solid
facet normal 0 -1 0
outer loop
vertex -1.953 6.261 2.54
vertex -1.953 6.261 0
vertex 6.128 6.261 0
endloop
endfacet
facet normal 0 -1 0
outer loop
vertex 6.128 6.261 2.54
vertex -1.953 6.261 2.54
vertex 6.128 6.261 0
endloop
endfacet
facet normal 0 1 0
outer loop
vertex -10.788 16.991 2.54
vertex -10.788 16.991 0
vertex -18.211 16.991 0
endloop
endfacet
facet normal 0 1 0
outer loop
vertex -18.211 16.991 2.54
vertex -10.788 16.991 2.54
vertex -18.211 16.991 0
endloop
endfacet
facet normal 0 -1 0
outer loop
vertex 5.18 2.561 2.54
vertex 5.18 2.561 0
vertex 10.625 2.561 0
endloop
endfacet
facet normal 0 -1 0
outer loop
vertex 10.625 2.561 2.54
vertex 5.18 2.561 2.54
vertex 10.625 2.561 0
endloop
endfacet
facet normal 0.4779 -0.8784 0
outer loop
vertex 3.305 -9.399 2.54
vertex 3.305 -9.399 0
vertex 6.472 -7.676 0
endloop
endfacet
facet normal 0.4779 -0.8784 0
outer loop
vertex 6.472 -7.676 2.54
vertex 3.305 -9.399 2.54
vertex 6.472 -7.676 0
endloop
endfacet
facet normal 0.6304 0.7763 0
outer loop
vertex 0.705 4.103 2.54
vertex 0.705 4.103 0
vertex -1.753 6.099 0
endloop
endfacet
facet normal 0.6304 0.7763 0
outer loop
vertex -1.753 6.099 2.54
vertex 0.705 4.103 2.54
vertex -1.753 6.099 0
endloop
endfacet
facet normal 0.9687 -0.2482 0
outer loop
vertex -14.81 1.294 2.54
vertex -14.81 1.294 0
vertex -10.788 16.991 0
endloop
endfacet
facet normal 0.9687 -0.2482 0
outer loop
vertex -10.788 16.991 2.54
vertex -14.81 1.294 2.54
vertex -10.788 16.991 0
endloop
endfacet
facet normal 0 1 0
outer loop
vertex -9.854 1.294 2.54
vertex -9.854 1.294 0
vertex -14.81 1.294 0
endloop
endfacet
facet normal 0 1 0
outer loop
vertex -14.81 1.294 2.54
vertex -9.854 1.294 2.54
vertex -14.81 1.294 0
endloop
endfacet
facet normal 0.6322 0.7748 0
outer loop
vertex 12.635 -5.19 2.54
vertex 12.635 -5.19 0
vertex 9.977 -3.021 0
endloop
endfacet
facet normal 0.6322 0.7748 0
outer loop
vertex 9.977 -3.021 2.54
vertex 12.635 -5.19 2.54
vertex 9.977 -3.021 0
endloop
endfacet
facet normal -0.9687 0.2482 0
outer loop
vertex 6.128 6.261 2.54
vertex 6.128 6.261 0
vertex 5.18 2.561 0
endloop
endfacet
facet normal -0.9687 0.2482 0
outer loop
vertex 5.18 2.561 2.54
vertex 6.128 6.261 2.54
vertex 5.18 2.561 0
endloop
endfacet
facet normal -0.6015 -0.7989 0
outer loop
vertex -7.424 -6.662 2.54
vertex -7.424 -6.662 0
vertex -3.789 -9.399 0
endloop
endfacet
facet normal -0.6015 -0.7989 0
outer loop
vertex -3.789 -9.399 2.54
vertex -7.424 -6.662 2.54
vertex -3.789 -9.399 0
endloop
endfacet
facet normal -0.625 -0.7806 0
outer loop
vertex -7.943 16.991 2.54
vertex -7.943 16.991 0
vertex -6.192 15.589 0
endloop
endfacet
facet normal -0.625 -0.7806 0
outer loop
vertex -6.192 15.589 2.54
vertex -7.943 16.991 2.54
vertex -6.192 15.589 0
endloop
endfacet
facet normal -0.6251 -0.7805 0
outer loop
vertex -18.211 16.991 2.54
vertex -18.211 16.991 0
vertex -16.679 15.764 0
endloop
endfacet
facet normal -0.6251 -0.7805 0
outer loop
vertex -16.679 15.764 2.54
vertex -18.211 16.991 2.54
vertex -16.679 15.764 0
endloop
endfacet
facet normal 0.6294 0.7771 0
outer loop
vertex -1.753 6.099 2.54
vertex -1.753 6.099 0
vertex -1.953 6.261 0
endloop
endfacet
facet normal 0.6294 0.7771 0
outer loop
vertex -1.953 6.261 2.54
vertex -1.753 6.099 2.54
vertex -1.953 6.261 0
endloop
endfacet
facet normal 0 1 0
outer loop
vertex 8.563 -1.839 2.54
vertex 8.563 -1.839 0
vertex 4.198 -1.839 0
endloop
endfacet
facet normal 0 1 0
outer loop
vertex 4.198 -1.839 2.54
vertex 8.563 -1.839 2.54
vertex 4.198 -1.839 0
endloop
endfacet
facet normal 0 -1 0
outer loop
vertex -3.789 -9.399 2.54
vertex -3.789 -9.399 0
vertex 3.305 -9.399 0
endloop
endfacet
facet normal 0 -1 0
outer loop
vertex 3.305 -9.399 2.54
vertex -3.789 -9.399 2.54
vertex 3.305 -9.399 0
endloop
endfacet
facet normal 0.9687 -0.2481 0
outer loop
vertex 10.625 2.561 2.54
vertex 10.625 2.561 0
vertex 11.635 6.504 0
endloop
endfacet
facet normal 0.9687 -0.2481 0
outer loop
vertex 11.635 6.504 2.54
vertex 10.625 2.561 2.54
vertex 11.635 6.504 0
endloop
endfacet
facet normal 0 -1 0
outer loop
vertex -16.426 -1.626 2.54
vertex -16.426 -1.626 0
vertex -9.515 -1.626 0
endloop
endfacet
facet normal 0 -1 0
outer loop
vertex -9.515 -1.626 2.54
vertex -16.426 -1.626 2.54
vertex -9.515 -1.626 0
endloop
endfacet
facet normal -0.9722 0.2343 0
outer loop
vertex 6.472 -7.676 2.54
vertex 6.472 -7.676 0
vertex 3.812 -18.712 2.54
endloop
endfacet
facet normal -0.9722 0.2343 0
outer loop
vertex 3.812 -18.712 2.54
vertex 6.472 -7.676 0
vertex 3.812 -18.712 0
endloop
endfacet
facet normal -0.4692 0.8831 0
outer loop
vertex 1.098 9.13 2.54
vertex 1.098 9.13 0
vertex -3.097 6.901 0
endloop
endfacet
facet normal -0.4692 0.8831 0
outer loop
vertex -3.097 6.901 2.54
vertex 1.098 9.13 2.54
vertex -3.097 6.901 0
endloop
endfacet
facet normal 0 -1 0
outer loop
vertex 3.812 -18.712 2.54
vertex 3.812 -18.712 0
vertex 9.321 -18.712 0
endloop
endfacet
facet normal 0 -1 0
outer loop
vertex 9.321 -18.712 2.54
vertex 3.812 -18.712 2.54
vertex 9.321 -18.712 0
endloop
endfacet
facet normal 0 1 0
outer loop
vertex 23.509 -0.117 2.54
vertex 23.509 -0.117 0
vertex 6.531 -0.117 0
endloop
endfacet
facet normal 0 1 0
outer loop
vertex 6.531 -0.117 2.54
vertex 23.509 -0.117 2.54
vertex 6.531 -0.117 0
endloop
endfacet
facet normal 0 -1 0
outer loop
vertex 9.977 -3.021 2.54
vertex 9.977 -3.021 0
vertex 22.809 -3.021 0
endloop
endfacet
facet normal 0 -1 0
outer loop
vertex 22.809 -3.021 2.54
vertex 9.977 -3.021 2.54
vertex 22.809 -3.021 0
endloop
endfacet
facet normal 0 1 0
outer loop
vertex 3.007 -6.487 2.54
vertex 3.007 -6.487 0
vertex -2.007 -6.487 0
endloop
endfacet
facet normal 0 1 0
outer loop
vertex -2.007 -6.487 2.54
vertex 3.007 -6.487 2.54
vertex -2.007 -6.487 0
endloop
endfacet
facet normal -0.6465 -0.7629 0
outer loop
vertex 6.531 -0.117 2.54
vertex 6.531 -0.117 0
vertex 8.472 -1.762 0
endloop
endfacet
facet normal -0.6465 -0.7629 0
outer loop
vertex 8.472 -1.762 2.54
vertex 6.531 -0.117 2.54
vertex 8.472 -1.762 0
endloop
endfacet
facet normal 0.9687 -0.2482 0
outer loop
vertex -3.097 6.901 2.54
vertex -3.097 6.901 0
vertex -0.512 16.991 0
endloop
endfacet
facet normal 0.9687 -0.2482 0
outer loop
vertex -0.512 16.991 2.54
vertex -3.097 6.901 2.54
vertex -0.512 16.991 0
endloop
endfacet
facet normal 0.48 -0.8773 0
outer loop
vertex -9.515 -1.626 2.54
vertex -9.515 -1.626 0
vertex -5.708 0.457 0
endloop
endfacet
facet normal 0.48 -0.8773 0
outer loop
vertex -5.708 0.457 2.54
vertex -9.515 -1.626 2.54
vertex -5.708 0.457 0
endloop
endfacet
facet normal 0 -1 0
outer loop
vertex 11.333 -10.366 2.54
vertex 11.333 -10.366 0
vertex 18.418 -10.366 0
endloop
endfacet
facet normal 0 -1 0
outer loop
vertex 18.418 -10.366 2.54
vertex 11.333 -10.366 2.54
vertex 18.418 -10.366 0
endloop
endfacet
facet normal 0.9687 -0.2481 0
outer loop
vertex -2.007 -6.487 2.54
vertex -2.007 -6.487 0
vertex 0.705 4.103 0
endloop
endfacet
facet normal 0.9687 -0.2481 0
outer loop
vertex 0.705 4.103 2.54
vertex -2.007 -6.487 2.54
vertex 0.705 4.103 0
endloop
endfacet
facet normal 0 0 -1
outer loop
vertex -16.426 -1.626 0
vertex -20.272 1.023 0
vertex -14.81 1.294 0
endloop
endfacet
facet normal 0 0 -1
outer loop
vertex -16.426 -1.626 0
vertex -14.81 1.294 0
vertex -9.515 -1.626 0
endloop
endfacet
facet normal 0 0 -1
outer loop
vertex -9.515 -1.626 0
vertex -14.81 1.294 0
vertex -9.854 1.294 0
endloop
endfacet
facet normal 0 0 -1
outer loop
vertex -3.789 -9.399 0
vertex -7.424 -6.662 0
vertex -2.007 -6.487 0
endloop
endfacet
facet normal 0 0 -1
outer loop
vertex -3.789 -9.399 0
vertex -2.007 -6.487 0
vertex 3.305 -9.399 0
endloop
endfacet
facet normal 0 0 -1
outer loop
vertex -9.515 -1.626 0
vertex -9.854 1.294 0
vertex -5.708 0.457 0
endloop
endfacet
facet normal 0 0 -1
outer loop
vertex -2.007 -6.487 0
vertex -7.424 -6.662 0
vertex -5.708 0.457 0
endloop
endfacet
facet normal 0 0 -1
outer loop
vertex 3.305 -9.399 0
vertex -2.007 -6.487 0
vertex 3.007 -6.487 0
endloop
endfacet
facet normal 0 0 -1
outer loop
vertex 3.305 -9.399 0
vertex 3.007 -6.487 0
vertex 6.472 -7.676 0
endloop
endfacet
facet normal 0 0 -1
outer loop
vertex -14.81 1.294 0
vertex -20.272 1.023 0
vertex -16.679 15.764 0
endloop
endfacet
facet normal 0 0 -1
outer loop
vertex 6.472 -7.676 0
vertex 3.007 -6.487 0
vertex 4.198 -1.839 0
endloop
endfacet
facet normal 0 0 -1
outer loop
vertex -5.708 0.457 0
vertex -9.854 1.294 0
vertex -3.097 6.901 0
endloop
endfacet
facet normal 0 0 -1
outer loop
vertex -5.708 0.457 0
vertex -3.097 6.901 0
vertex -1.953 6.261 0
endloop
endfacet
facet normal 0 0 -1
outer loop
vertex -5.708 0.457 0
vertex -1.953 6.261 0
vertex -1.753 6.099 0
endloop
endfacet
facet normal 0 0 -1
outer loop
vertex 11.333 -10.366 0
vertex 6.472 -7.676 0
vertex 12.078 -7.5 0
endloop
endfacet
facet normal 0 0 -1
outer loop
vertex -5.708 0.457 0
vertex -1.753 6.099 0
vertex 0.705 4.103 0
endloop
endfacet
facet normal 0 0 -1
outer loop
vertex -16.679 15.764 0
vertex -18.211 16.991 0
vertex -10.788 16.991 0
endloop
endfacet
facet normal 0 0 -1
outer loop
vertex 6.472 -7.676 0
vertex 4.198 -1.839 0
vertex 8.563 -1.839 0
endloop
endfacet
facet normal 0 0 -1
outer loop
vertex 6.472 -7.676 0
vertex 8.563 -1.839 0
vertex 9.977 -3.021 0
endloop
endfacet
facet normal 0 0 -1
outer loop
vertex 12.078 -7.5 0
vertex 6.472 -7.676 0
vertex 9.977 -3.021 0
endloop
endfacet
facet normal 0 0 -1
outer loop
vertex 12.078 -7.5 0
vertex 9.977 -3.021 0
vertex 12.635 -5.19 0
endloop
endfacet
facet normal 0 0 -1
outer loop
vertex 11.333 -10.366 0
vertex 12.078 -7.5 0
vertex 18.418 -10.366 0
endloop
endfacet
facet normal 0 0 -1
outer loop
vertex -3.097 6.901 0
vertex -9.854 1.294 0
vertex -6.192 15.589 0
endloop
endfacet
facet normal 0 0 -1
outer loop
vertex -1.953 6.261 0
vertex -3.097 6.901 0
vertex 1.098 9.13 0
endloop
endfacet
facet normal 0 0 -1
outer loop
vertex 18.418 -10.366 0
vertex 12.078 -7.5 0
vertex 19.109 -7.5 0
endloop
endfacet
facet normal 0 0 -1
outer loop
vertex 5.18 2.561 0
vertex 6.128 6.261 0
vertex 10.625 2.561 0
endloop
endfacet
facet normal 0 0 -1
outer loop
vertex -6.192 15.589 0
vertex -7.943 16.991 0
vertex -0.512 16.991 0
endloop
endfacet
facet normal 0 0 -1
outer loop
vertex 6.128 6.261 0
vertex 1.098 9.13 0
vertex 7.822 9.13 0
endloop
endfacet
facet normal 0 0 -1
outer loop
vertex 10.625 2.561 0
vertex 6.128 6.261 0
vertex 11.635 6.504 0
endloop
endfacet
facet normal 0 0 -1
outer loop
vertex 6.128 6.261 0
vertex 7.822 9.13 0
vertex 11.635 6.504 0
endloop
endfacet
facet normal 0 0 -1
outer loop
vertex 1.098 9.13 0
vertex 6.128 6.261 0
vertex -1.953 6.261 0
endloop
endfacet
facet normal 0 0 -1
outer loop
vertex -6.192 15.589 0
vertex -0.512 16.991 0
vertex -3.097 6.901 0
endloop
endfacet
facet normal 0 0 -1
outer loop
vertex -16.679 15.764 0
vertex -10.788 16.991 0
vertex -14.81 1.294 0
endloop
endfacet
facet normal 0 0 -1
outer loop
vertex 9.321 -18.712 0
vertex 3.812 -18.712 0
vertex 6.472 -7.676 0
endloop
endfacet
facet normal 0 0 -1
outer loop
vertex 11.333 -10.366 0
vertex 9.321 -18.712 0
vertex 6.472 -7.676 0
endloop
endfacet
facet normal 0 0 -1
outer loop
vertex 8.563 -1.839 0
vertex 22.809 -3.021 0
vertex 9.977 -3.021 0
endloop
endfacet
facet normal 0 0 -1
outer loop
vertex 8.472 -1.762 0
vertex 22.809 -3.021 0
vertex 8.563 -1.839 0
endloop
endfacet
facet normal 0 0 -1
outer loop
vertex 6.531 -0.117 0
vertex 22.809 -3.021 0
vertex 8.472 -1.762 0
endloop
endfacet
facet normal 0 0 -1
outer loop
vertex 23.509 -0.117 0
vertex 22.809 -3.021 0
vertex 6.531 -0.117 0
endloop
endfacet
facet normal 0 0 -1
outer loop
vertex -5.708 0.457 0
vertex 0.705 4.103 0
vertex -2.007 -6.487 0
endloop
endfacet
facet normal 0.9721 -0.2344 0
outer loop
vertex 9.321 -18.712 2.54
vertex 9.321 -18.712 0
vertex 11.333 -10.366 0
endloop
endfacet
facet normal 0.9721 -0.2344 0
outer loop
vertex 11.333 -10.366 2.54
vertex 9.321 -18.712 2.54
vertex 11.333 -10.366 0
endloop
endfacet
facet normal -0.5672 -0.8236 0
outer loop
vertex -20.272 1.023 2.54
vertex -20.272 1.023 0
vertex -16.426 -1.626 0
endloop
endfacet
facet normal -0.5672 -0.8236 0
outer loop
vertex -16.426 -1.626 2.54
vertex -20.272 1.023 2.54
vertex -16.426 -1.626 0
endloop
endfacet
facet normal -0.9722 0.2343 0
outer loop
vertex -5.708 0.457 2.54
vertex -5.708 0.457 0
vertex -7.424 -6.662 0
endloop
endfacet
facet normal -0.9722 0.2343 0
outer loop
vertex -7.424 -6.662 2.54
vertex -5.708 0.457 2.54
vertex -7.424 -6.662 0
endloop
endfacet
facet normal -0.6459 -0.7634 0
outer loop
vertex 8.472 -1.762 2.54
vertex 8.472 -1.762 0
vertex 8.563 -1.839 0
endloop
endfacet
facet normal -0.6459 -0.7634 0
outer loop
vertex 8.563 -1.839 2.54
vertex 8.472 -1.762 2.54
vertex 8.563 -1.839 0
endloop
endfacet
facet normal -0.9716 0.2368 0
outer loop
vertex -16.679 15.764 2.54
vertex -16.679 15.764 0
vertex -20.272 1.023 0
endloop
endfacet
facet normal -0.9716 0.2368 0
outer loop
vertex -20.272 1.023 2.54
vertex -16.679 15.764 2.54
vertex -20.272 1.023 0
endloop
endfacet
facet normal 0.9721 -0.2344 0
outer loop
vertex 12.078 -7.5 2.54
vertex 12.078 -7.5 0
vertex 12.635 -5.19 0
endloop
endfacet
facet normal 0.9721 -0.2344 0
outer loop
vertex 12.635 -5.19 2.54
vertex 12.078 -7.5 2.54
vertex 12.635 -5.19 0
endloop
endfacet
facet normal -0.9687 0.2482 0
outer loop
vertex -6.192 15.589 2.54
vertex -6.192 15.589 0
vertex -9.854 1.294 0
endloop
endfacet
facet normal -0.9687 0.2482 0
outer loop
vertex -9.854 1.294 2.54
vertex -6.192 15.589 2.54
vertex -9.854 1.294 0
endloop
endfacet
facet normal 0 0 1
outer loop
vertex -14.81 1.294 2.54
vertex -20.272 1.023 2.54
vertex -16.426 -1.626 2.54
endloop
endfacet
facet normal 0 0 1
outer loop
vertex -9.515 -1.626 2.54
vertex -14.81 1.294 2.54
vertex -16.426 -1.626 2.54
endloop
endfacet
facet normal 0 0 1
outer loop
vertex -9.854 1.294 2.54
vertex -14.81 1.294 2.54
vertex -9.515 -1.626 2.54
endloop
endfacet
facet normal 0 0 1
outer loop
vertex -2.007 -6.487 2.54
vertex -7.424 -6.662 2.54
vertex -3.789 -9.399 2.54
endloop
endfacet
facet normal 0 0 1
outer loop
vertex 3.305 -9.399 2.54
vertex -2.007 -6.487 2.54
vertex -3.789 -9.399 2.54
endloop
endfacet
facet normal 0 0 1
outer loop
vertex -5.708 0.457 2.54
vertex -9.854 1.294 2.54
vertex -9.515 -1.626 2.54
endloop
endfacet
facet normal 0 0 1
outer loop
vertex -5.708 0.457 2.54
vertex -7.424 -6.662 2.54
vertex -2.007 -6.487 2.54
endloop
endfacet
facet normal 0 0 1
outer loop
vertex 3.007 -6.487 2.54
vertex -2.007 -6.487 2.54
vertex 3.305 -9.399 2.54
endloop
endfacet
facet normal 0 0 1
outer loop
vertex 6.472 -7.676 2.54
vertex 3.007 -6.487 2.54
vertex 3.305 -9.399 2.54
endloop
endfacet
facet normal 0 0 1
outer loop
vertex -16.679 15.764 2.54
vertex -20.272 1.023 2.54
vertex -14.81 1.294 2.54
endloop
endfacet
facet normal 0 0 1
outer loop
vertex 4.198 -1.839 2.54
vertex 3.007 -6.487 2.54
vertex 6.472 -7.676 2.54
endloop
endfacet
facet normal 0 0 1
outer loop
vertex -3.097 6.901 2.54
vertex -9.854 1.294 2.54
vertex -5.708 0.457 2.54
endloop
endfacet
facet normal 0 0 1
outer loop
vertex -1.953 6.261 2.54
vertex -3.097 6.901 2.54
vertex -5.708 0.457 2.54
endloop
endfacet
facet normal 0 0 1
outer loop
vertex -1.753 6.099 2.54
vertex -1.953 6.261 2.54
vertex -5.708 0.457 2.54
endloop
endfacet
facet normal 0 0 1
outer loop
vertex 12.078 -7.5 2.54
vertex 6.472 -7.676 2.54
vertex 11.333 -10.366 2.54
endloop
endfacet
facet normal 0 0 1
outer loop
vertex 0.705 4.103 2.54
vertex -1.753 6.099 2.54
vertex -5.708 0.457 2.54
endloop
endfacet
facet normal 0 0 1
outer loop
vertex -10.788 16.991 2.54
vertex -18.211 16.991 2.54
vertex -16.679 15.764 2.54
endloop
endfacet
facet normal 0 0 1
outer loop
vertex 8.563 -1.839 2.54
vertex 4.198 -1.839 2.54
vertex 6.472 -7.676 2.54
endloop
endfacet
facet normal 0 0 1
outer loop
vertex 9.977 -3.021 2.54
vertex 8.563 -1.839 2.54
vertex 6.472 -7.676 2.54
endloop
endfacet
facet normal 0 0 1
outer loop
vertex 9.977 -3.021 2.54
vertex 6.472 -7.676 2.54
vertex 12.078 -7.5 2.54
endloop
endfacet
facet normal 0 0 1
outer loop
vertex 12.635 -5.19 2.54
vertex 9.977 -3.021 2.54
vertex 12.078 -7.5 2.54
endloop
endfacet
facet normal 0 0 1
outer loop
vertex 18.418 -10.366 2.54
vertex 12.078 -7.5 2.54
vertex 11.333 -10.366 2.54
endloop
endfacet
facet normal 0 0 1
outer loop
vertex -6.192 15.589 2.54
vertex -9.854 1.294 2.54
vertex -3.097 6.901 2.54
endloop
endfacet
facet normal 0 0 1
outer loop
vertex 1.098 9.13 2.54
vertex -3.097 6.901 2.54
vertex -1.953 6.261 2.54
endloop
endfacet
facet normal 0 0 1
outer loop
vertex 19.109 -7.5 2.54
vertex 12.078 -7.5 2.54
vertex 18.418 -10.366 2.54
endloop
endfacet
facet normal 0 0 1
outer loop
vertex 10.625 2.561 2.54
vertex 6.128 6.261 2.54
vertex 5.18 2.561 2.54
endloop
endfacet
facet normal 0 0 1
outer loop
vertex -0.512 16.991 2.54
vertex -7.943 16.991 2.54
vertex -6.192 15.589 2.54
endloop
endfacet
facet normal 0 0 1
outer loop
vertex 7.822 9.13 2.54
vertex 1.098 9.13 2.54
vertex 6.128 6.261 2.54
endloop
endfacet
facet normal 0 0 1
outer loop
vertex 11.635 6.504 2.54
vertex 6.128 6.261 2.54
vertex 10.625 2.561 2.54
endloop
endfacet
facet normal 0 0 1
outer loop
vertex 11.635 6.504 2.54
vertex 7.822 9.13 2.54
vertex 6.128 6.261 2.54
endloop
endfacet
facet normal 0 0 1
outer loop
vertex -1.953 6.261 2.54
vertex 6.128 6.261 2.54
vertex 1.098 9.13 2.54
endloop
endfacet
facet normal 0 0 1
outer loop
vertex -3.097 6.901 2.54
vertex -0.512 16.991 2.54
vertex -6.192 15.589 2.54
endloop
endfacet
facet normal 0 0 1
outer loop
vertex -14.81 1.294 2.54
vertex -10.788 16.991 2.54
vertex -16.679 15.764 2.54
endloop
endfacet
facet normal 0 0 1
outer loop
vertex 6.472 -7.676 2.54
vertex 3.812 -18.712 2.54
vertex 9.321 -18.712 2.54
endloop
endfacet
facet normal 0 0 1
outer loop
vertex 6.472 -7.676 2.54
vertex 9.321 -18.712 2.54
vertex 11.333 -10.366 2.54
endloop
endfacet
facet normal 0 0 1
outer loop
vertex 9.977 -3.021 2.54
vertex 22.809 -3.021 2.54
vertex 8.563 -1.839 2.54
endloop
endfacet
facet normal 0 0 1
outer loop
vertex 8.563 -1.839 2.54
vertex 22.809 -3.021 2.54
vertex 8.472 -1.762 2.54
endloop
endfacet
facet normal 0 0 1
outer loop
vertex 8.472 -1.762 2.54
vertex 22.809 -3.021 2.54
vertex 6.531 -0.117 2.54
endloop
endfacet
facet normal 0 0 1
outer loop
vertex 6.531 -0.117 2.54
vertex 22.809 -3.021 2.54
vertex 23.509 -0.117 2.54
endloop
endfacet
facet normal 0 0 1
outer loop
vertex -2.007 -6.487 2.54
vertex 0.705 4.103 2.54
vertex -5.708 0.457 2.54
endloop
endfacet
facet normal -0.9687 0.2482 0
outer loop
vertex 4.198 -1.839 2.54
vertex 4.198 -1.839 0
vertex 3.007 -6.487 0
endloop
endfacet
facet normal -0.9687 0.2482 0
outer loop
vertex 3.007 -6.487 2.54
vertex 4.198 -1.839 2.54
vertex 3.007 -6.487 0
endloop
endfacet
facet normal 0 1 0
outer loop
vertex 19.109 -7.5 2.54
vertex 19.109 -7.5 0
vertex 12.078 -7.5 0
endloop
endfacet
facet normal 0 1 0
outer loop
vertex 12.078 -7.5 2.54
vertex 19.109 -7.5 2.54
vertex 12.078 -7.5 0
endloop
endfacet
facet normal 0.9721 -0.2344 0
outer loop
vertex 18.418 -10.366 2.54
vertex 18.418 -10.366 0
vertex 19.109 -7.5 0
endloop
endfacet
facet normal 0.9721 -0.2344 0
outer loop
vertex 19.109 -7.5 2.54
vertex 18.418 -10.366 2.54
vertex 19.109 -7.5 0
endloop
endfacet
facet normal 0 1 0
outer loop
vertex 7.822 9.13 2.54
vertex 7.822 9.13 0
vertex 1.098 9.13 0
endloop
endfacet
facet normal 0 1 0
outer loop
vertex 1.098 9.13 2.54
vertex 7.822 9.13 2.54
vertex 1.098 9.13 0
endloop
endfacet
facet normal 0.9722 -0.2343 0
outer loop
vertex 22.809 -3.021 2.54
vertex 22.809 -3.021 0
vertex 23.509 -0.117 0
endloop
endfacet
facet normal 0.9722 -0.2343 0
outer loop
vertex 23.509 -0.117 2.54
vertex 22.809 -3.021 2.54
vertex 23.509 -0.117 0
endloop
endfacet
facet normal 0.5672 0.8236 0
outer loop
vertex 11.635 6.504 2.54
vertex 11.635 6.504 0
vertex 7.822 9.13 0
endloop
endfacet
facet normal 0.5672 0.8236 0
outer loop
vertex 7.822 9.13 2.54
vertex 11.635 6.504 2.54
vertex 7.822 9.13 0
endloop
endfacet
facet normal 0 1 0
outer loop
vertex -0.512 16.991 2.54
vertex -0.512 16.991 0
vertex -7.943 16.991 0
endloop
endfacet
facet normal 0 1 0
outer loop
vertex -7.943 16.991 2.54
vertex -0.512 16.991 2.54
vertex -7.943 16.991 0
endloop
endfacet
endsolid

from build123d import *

# Parameters (mm, degrees)
F1_DEPTH = 2.54


with BuildPart() as f1:
    # F0 (on Top) → F1 (new body)
    with BuildSketch(Plane.XY):
        Polygon((-5.995896, -7.13228), (-6.844743, -6.480798), (-3.836085, 6.000167), (1.180427, 8.666), (7.587111, 8.666), (8.813967, 7.821221), (1.488084, 7.821221), (-1.447063, 6.26145), (6.127988, 6.26145), (5.180136, 2.561404), (10.624545, 2.561404), (11.634617, 6.504334), (7.82159, 9.129876), (1.097838, 9.129876), (-3.096944, 6.90072), (-0.511983, 16.991402), (-7.943114, 16.991402), (-6.19218, 15.589118), (-9.854238, 1.293863), (-14.809527, 1.293863), (-10.788241, 16.991402), (-18.210795, 16.991402), (-16.678699, 15.764381), (-20.272369, 1.022546), (-16.425734, -1.626137), (-9.515389, -1.626137), (-5.70774, 0.457038), (-7.423887, -6.662141), (-3.788898, -9.398828), (3.305492, -9.398828), (6.472039, -7.676311), (3.811726, -18.712221), (9.321281, -18.712221), (11.333264, -10.365812), (18.418461, -10.365812), (19.109229, -7.500265), (12.078154, -7.500265), (12.634992, -5.190304), (9.977397, -3.021413), (22.809136, -3.021413), (23.509286, -0.116946), (6.530533, -0.116946), (8.472281, -1.761667), (8.616393, -1.173794), (7.928506, -0.700135), (22.899743, -0.700135), (22.701854, -1.52105), (9.492916, -1.52105), (5.462863, -18.23912), (4.432984, -18.23912), (8.453434, -1.83855), (4.198023, -1.83855), (3.007288, -6.486717), (-2.007372, -6.486717), (0.705341, 4.102662), (-1.752948, 6.098899), (-2.961167, 5.456838), align=None)
        Polygon((-1.893178, -7.869553), (-1.667288, -6.998886), (3.390135, -6.998886), (4.516308, -2.327129), (7.205165, -2.327129), (6.993239, -3.206271), (5.234903, -3.206271), (4.110773, -7.869553), align=None, mode=Mode.SUBTRACT)
        Polygon((12.062723, -8.862222), (12.301775, -7.946932), (18.437441, -7.946932), (18.216802, -8.862222), align=None, mode=Mode.SUBTRACT)
        Polygon((-18.89434, 0.720949), (-19.655613, 1.344398), (-16.097893, 15.938756), (-16.728074, 16.443454), (-11.468086, 16.443454), (-11.679474, 15.576306), (-15.272995, 15.576306), align=None, mode=Mode.SUBTRACT)
        Polygon((-14.482171, 0.81359), (-9.49441, 0.81359), (-5.643328, 15.846721), (-6.503054, 16.535256), (-1.127594, 16.535256), (-1.376828, 15.562343), (-4.912582, 15.562343), (-8.926276, -0.105562), (-14.717633, -0.105562), align=None, mode=Mode.SUBTRACT)
        Polygon((5.828837, 2.995504), (6.583156, 5.94395), (7.486715, 5.94395), (6.775963, 2.995504), align=None, mode=Mode.SUBTRACT)
        Polygon((-3.836085, 6.000167), (-6.844743, -6.480798), (-5.995896, -7.13228), (-2.961167, 5.456838), (-1.752948, 6.098899), (-1.953123, 6.26145), (-1.447063, 6.26145), (1.488084, 7.821221), (8.813967, 7.821221), (7.587111, 8.666), (1.180427, 8.666), align=None)
        Polygon((-5.643328, 15.846721), (-9.49441, 0.81359), (-14.482171, 0.81359), (-14.717633, -0.105562), (-8.926276, -0.105562), (-4.912582, 15.562343), (-1.376828, 15.562343), (-1.127594, 16.535256), (-6.503054, 16.535256), align=None)
        Polygon((-16.097893, 15.938756), (-19.655613, 1.344398), (-18.89434, 0.720949), (-15.272995, 15.576306), (-11.679474, 15.576306), (-11.468086, 16.443454), (-16.728074, 16.443454), align=None)
        Polygon((7.486715, 5.94395), (6.583156, 5.94395), (5.828837, 2.995504), (6.775963, 2.995504), align=None)
        Polygon((8.563047, -1.83855), (8.453434, -1.83855), (4.432984, -18.23912), (5.462863, -18.23912), (9.492916, -1.52105), (22.701854, -1.52105), (22.899743, -0.700135), (7.928506, -0.700135), (8.616393, -1.173794), (8.472281, -1.761667), align=None)
        Polygon((3.390135, -6.998886), (-1.667288, -6.998886), (-1.893178, -7.869553), (4.110773, -7.869553), (5.234903, -3.206271), (6.993239, -3.206271), (7.205165, -2.327129), (4.516308, -2.327129), align=None)
        Polygon((18.437441, -7.946932), (12.301775, -7.946932), (12.062723, -8.862222), (18.216802, -8.862222), align=None)
    extrude(amount=F1_DEPTH)


solid = f1.part
